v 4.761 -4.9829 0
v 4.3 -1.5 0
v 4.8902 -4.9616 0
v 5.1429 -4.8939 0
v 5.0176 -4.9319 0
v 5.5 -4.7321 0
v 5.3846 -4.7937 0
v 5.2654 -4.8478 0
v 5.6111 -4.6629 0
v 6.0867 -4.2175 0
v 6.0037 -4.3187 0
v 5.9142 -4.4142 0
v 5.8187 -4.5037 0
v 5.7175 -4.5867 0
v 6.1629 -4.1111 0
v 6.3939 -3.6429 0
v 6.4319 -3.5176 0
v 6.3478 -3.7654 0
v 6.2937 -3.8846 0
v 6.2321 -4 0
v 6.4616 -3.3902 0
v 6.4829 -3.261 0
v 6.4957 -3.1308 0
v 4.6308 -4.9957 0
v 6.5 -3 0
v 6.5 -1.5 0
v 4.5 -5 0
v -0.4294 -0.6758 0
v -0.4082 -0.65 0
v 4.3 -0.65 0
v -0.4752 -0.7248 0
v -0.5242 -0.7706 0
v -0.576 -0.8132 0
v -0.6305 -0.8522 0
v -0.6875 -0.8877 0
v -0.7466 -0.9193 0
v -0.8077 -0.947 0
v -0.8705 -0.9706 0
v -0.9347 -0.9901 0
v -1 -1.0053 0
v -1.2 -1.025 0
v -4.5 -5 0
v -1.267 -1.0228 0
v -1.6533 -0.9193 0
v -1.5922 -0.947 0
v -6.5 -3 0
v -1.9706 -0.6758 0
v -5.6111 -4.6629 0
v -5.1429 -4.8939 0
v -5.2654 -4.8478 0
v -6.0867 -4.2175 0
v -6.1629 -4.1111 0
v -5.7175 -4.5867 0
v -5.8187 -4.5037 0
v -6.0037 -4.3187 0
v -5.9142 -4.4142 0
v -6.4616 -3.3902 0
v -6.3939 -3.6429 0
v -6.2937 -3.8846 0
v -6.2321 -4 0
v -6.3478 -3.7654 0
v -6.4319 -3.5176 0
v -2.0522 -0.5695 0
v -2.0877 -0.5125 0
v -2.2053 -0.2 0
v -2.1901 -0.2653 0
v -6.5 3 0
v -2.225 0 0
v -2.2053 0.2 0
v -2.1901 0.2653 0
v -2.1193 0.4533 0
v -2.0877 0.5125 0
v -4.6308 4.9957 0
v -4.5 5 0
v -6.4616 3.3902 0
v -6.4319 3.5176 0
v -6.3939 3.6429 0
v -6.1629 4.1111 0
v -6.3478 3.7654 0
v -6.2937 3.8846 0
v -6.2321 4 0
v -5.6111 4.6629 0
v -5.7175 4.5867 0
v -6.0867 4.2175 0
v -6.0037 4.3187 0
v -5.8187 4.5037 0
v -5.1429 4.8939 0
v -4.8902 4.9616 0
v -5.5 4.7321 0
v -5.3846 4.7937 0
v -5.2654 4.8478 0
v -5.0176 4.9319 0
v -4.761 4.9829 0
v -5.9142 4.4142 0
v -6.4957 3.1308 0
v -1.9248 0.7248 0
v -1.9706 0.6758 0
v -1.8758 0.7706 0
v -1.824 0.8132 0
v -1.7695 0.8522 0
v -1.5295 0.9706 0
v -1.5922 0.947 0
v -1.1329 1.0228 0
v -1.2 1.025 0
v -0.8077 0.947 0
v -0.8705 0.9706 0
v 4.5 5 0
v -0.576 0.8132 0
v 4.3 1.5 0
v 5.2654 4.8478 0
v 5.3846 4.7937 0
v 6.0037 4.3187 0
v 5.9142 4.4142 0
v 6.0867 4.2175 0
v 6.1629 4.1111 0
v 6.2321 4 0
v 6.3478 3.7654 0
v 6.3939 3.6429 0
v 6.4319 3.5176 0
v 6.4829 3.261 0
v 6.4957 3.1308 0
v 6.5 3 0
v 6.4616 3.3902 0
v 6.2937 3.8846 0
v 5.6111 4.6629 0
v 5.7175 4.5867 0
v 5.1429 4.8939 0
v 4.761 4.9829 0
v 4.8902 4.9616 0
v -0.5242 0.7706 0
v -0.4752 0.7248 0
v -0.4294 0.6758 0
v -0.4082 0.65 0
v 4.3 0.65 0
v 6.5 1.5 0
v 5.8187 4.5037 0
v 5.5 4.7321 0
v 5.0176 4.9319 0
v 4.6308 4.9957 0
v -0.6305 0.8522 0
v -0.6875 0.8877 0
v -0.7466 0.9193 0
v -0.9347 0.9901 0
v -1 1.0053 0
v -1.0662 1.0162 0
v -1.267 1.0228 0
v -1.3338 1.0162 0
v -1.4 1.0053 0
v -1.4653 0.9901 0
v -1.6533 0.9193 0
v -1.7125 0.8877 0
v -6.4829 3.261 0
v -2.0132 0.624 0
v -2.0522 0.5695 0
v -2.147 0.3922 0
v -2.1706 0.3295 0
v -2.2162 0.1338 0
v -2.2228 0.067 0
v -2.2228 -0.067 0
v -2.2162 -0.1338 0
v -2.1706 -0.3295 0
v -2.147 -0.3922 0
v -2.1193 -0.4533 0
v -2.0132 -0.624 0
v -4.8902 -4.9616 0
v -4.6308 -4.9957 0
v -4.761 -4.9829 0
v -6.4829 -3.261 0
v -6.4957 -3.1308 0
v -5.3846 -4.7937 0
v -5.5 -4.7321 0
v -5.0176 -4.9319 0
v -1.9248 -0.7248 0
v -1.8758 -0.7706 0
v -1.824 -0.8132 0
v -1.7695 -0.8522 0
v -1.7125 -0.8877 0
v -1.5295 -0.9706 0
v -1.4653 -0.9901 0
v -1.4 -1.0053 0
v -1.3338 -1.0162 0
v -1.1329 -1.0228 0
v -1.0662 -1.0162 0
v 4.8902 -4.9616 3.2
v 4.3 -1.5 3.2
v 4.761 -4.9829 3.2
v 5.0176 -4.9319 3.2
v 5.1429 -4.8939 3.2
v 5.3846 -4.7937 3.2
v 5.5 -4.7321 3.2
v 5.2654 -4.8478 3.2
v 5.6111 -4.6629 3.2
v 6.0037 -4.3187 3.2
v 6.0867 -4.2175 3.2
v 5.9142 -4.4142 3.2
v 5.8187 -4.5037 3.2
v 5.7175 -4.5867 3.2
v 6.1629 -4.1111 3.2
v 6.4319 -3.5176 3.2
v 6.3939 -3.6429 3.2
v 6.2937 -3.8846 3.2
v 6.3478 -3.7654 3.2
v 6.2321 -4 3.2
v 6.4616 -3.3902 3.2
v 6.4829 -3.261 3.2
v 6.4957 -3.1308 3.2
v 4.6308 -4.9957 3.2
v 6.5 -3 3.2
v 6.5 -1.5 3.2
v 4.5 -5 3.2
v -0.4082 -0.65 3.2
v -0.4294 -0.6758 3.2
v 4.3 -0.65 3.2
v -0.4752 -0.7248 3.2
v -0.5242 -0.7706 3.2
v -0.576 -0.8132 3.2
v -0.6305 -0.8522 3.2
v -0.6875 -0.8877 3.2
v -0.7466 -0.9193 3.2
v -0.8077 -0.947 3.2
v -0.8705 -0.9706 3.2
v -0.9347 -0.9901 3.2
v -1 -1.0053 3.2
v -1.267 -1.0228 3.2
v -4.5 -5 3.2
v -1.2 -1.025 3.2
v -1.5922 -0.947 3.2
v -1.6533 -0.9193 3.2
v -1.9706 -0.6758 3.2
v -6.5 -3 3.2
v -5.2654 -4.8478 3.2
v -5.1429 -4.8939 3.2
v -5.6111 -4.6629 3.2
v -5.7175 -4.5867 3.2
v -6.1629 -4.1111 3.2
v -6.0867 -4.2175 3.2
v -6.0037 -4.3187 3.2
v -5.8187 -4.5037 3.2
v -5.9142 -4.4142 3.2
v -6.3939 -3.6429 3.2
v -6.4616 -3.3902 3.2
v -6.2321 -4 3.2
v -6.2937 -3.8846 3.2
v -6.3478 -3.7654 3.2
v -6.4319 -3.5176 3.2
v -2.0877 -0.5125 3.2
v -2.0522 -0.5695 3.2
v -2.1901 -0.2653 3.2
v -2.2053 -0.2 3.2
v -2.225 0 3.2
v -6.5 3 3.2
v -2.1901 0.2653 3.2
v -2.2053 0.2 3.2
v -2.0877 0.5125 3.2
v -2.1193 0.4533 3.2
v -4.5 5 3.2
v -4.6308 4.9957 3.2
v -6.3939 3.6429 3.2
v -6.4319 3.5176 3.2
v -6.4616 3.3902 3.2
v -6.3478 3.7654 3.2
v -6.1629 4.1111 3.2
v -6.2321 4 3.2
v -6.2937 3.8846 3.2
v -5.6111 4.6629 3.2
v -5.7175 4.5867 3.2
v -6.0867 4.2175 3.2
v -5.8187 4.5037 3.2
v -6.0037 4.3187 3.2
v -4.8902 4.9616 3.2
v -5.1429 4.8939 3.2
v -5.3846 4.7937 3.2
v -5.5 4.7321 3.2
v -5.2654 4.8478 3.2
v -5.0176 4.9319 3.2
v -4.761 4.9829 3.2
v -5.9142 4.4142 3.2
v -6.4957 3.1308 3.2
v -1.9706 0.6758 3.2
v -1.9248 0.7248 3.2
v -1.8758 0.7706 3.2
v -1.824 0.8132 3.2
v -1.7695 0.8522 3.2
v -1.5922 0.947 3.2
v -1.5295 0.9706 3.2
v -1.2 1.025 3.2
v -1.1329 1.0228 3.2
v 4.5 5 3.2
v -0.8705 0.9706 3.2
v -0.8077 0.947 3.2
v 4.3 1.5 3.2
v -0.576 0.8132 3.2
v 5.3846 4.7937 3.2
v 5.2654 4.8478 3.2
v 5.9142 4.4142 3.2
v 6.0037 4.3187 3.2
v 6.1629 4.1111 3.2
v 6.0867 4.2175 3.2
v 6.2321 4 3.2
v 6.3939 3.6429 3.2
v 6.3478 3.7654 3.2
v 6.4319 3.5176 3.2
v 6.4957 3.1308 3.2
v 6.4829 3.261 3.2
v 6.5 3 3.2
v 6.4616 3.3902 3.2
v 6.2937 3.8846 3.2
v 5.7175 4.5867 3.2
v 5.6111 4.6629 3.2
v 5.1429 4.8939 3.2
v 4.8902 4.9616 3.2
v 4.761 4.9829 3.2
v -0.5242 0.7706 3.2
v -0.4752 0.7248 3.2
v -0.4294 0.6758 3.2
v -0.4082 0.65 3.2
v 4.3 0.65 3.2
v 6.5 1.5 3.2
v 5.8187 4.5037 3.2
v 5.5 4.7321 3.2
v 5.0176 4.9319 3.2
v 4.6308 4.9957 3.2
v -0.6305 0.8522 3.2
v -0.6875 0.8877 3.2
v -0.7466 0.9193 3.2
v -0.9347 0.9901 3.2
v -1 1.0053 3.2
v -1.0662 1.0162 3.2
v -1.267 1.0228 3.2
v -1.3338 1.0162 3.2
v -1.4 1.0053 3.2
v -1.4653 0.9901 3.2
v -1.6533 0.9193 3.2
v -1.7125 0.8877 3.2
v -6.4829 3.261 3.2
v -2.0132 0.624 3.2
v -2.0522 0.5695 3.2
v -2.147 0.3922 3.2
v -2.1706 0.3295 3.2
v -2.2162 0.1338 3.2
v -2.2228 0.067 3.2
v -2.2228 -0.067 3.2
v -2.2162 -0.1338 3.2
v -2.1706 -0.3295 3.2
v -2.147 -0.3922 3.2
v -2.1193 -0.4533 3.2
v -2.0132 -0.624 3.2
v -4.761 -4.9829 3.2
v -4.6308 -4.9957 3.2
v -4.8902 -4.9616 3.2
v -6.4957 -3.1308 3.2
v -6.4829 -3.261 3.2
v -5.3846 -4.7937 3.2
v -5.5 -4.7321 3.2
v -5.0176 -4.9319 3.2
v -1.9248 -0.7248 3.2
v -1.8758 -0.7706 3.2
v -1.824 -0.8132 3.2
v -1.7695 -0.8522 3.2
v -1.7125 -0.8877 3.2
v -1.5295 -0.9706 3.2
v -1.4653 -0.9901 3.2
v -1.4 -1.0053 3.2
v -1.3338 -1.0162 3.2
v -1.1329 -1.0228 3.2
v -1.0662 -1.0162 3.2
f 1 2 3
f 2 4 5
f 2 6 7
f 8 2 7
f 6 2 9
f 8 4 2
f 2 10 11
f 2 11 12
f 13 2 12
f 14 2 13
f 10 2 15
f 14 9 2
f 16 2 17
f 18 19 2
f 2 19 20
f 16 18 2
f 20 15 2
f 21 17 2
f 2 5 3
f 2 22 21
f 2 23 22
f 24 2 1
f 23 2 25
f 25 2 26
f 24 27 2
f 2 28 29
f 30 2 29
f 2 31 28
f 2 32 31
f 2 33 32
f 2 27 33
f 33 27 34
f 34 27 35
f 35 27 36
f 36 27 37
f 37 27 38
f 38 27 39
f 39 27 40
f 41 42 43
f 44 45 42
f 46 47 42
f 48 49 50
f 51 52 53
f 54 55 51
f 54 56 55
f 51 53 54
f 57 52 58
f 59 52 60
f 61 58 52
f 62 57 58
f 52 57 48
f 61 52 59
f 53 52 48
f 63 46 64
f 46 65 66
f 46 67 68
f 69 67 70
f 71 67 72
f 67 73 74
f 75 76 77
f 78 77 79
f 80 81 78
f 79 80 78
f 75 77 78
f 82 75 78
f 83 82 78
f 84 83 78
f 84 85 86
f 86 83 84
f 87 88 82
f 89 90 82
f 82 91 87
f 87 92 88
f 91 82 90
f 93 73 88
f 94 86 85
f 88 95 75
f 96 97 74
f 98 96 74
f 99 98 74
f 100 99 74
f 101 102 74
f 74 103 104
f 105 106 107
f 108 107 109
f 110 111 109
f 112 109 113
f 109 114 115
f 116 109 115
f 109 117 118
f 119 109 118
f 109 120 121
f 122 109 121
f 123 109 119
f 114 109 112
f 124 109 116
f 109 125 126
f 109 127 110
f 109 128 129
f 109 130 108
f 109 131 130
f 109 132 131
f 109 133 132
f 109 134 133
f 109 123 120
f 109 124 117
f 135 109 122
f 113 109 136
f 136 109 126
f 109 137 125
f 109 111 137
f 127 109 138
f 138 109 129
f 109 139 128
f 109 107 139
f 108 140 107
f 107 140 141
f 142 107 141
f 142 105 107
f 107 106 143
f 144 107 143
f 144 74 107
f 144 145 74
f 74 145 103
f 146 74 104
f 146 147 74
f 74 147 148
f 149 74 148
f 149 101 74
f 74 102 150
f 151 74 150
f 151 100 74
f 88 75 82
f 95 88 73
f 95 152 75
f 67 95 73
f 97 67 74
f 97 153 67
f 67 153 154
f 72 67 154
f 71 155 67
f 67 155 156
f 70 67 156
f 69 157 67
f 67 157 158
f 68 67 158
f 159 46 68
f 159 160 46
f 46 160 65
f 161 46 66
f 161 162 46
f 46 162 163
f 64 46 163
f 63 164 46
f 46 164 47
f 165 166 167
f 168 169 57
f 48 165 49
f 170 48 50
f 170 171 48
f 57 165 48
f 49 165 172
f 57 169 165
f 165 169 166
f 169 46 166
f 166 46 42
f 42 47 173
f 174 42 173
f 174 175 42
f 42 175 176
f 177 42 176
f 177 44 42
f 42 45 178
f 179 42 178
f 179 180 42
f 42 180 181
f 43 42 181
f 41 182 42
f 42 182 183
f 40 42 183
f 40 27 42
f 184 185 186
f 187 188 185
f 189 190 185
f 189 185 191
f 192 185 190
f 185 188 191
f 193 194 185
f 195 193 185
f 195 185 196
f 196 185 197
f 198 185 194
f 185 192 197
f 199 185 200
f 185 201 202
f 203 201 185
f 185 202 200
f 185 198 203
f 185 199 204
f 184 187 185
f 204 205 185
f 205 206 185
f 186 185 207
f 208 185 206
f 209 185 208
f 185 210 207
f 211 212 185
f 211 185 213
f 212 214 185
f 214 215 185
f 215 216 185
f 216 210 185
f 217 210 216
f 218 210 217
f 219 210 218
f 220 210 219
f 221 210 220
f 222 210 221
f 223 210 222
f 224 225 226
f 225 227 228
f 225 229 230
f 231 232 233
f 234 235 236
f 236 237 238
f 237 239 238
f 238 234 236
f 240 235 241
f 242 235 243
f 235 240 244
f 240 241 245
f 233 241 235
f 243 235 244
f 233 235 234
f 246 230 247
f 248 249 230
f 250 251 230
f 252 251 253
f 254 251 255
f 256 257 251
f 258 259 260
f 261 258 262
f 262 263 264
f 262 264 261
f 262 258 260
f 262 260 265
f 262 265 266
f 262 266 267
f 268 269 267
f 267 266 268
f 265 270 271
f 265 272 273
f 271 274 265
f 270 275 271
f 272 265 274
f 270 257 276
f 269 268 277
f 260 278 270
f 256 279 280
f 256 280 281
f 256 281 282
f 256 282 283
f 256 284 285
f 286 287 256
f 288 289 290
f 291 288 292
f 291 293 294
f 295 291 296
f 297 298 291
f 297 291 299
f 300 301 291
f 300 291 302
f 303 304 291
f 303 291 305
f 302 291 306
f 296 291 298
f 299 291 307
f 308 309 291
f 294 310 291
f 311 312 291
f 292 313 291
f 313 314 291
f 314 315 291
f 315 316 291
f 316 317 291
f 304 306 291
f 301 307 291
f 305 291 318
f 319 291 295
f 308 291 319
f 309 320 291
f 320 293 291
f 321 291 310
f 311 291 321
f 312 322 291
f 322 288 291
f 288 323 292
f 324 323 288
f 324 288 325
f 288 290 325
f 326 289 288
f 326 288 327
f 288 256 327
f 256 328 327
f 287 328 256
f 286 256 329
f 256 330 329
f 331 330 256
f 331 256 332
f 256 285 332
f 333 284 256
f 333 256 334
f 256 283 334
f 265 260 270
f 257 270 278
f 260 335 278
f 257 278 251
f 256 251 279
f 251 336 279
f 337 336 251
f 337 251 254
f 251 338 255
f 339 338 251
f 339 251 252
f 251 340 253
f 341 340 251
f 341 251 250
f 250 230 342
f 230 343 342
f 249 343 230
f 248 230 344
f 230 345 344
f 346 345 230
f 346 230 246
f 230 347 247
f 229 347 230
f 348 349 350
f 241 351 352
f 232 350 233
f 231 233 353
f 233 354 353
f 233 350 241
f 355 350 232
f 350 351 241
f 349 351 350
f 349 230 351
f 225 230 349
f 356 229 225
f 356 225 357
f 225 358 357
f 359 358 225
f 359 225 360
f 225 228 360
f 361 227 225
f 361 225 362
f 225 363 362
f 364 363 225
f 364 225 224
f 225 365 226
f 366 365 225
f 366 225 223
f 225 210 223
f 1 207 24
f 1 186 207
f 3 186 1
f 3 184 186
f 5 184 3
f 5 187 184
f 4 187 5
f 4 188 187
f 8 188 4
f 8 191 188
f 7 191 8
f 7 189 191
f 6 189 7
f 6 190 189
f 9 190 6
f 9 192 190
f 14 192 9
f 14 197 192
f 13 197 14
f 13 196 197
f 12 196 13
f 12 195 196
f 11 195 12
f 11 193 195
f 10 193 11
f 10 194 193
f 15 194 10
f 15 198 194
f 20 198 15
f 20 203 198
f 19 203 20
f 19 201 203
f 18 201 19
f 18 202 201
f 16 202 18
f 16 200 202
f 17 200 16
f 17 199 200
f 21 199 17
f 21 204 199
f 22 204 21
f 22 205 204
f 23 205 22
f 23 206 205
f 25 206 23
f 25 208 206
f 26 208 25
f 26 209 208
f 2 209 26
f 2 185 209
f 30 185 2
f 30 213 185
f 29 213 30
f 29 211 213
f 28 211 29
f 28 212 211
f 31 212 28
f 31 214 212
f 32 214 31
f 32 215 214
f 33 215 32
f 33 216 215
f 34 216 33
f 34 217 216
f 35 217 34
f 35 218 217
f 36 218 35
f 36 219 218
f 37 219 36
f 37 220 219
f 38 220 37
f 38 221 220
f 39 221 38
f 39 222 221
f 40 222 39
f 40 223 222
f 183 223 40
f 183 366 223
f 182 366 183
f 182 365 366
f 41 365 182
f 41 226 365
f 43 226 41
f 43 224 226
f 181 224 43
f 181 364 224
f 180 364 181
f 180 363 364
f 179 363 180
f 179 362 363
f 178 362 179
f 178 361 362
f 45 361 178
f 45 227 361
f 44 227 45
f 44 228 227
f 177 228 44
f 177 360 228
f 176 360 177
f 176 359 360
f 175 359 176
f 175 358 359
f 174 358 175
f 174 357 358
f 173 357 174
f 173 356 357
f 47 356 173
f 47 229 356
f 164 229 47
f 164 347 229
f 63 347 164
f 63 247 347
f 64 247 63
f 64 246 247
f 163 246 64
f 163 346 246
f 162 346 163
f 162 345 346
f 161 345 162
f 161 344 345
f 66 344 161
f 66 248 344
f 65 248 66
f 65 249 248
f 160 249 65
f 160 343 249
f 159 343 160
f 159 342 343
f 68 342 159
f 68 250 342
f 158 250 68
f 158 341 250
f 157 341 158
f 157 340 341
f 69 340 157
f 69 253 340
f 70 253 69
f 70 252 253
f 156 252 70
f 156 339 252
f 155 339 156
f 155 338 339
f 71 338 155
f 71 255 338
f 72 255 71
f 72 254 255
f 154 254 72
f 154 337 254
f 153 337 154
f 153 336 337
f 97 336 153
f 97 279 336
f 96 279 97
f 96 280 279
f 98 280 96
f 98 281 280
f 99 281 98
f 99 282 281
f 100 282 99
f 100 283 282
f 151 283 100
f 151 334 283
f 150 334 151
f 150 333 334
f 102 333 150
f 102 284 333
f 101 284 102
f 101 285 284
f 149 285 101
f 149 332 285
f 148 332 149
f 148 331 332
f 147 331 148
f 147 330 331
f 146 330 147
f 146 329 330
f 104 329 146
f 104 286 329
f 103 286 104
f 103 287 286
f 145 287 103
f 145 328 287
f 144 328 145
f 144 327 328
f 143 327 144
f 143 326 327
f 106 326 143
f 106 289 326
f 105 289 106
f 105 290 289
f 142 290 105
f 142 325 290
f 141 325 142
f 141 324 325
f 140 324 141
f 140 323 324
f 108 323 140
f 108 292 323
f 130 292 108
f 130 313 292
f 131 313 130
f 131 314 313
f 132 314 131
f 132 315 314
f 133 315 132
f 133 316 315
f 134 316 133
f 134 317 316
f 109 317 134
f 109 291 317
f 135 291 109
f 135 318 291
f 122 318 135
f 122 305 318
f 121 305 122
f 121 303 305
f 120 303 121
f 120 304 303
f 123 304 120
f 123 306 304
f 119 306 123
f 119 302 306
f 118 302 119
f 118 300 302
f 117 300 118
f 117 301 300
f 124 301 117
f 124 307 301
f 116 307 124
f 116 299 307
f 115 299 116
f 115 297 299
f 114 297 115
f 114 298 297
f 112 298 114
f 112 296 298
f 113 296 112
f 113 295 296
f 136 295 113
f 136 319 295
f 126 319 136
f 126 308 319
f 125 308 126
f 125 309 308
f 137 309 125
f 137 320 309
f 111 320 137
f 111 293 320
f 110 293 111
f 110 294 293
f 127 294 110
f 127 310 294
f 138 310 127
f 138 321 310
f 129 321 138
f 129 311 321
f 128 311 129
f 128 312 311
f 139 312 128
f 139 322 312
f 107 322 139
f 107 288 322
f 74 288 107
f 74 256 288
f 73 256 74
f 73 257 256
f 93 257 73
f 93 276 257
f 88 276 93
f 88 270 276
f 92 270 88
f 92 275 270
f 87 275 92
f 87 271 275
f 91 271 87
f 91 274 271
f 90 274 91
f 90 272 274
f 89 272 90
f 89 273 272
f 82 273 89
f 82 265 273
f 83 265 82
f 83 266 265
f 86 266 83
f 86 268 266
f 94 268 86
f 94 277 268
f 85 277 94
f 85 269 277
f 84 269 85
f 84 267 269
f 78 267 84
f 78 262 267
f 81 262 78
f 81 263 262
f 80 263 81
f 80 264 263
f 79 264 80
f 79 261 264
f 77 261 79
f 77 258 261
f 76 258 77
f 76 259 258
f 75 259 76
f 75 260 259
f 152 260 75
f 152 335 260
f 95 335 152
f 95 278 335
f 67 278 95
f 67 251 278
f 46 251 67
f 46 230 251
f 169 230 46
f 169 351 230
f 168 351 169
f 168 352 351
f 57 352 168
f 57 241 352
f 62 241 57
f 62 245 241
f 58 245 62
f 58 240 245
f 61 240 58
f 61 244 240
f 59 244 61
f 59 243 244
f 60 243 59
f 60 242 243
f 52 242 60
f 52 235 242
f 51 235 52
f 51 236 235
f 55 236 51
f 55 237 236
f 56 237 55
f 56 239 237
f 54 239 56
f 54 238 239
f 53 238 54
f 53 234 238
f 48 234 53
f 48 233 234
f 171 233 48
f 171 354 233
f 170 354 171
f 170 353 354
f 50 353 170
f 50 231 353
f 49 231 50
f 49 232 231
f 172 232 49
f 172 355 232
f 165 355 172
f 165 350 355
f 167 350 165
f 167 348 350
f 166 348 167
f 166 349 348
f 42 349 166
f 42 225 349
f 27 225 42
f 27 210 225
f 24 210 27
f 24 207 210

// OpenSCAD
// Filament-Stoppclip fuer 1,75-mm-Filament
// Ein Teil drucken. Auf das ca. 10 mm aus dem PTFE-Schlauch ragende Filament aufschnappen.
$fn = 96;

clip_length = 13.0;
clip_width = 10.0;
clip_thickness = 3.2;
corner_radius = 2.0;
filament_pocket_d = 2.05;
snap_slot_width = 1.3;
mouth_width = 3.0;
pocket_x = -1.2;

module rounded_rect_2d(size=[10,10], r=2) {
    offset(r=r) square([size[0]-2*r, size[1]-2*r], center=true);
}

module filament_stoppclip() {
    linear_extrude(height=clip_thickness)
    difference() {
        rounded_rect_2d([clip_length, clip_width], corner_radius);
        translate([pocket_x,0]) circle(d=filament_pocket_d);
        // schmaler federnder Einsteckschlitz
        translate([(pocket_x + clip_length/2 + 0.8)/2,0])
            square([clip_length/2 + 0.8 - pocket_x, snap_slot_width], center=true);
        // aufgeweitete Einfuehrung
        translate([clip_length/2-0.8,0])
            square([2.8, mouth_width], center=true);
    }
}

filament_stoppclip();
